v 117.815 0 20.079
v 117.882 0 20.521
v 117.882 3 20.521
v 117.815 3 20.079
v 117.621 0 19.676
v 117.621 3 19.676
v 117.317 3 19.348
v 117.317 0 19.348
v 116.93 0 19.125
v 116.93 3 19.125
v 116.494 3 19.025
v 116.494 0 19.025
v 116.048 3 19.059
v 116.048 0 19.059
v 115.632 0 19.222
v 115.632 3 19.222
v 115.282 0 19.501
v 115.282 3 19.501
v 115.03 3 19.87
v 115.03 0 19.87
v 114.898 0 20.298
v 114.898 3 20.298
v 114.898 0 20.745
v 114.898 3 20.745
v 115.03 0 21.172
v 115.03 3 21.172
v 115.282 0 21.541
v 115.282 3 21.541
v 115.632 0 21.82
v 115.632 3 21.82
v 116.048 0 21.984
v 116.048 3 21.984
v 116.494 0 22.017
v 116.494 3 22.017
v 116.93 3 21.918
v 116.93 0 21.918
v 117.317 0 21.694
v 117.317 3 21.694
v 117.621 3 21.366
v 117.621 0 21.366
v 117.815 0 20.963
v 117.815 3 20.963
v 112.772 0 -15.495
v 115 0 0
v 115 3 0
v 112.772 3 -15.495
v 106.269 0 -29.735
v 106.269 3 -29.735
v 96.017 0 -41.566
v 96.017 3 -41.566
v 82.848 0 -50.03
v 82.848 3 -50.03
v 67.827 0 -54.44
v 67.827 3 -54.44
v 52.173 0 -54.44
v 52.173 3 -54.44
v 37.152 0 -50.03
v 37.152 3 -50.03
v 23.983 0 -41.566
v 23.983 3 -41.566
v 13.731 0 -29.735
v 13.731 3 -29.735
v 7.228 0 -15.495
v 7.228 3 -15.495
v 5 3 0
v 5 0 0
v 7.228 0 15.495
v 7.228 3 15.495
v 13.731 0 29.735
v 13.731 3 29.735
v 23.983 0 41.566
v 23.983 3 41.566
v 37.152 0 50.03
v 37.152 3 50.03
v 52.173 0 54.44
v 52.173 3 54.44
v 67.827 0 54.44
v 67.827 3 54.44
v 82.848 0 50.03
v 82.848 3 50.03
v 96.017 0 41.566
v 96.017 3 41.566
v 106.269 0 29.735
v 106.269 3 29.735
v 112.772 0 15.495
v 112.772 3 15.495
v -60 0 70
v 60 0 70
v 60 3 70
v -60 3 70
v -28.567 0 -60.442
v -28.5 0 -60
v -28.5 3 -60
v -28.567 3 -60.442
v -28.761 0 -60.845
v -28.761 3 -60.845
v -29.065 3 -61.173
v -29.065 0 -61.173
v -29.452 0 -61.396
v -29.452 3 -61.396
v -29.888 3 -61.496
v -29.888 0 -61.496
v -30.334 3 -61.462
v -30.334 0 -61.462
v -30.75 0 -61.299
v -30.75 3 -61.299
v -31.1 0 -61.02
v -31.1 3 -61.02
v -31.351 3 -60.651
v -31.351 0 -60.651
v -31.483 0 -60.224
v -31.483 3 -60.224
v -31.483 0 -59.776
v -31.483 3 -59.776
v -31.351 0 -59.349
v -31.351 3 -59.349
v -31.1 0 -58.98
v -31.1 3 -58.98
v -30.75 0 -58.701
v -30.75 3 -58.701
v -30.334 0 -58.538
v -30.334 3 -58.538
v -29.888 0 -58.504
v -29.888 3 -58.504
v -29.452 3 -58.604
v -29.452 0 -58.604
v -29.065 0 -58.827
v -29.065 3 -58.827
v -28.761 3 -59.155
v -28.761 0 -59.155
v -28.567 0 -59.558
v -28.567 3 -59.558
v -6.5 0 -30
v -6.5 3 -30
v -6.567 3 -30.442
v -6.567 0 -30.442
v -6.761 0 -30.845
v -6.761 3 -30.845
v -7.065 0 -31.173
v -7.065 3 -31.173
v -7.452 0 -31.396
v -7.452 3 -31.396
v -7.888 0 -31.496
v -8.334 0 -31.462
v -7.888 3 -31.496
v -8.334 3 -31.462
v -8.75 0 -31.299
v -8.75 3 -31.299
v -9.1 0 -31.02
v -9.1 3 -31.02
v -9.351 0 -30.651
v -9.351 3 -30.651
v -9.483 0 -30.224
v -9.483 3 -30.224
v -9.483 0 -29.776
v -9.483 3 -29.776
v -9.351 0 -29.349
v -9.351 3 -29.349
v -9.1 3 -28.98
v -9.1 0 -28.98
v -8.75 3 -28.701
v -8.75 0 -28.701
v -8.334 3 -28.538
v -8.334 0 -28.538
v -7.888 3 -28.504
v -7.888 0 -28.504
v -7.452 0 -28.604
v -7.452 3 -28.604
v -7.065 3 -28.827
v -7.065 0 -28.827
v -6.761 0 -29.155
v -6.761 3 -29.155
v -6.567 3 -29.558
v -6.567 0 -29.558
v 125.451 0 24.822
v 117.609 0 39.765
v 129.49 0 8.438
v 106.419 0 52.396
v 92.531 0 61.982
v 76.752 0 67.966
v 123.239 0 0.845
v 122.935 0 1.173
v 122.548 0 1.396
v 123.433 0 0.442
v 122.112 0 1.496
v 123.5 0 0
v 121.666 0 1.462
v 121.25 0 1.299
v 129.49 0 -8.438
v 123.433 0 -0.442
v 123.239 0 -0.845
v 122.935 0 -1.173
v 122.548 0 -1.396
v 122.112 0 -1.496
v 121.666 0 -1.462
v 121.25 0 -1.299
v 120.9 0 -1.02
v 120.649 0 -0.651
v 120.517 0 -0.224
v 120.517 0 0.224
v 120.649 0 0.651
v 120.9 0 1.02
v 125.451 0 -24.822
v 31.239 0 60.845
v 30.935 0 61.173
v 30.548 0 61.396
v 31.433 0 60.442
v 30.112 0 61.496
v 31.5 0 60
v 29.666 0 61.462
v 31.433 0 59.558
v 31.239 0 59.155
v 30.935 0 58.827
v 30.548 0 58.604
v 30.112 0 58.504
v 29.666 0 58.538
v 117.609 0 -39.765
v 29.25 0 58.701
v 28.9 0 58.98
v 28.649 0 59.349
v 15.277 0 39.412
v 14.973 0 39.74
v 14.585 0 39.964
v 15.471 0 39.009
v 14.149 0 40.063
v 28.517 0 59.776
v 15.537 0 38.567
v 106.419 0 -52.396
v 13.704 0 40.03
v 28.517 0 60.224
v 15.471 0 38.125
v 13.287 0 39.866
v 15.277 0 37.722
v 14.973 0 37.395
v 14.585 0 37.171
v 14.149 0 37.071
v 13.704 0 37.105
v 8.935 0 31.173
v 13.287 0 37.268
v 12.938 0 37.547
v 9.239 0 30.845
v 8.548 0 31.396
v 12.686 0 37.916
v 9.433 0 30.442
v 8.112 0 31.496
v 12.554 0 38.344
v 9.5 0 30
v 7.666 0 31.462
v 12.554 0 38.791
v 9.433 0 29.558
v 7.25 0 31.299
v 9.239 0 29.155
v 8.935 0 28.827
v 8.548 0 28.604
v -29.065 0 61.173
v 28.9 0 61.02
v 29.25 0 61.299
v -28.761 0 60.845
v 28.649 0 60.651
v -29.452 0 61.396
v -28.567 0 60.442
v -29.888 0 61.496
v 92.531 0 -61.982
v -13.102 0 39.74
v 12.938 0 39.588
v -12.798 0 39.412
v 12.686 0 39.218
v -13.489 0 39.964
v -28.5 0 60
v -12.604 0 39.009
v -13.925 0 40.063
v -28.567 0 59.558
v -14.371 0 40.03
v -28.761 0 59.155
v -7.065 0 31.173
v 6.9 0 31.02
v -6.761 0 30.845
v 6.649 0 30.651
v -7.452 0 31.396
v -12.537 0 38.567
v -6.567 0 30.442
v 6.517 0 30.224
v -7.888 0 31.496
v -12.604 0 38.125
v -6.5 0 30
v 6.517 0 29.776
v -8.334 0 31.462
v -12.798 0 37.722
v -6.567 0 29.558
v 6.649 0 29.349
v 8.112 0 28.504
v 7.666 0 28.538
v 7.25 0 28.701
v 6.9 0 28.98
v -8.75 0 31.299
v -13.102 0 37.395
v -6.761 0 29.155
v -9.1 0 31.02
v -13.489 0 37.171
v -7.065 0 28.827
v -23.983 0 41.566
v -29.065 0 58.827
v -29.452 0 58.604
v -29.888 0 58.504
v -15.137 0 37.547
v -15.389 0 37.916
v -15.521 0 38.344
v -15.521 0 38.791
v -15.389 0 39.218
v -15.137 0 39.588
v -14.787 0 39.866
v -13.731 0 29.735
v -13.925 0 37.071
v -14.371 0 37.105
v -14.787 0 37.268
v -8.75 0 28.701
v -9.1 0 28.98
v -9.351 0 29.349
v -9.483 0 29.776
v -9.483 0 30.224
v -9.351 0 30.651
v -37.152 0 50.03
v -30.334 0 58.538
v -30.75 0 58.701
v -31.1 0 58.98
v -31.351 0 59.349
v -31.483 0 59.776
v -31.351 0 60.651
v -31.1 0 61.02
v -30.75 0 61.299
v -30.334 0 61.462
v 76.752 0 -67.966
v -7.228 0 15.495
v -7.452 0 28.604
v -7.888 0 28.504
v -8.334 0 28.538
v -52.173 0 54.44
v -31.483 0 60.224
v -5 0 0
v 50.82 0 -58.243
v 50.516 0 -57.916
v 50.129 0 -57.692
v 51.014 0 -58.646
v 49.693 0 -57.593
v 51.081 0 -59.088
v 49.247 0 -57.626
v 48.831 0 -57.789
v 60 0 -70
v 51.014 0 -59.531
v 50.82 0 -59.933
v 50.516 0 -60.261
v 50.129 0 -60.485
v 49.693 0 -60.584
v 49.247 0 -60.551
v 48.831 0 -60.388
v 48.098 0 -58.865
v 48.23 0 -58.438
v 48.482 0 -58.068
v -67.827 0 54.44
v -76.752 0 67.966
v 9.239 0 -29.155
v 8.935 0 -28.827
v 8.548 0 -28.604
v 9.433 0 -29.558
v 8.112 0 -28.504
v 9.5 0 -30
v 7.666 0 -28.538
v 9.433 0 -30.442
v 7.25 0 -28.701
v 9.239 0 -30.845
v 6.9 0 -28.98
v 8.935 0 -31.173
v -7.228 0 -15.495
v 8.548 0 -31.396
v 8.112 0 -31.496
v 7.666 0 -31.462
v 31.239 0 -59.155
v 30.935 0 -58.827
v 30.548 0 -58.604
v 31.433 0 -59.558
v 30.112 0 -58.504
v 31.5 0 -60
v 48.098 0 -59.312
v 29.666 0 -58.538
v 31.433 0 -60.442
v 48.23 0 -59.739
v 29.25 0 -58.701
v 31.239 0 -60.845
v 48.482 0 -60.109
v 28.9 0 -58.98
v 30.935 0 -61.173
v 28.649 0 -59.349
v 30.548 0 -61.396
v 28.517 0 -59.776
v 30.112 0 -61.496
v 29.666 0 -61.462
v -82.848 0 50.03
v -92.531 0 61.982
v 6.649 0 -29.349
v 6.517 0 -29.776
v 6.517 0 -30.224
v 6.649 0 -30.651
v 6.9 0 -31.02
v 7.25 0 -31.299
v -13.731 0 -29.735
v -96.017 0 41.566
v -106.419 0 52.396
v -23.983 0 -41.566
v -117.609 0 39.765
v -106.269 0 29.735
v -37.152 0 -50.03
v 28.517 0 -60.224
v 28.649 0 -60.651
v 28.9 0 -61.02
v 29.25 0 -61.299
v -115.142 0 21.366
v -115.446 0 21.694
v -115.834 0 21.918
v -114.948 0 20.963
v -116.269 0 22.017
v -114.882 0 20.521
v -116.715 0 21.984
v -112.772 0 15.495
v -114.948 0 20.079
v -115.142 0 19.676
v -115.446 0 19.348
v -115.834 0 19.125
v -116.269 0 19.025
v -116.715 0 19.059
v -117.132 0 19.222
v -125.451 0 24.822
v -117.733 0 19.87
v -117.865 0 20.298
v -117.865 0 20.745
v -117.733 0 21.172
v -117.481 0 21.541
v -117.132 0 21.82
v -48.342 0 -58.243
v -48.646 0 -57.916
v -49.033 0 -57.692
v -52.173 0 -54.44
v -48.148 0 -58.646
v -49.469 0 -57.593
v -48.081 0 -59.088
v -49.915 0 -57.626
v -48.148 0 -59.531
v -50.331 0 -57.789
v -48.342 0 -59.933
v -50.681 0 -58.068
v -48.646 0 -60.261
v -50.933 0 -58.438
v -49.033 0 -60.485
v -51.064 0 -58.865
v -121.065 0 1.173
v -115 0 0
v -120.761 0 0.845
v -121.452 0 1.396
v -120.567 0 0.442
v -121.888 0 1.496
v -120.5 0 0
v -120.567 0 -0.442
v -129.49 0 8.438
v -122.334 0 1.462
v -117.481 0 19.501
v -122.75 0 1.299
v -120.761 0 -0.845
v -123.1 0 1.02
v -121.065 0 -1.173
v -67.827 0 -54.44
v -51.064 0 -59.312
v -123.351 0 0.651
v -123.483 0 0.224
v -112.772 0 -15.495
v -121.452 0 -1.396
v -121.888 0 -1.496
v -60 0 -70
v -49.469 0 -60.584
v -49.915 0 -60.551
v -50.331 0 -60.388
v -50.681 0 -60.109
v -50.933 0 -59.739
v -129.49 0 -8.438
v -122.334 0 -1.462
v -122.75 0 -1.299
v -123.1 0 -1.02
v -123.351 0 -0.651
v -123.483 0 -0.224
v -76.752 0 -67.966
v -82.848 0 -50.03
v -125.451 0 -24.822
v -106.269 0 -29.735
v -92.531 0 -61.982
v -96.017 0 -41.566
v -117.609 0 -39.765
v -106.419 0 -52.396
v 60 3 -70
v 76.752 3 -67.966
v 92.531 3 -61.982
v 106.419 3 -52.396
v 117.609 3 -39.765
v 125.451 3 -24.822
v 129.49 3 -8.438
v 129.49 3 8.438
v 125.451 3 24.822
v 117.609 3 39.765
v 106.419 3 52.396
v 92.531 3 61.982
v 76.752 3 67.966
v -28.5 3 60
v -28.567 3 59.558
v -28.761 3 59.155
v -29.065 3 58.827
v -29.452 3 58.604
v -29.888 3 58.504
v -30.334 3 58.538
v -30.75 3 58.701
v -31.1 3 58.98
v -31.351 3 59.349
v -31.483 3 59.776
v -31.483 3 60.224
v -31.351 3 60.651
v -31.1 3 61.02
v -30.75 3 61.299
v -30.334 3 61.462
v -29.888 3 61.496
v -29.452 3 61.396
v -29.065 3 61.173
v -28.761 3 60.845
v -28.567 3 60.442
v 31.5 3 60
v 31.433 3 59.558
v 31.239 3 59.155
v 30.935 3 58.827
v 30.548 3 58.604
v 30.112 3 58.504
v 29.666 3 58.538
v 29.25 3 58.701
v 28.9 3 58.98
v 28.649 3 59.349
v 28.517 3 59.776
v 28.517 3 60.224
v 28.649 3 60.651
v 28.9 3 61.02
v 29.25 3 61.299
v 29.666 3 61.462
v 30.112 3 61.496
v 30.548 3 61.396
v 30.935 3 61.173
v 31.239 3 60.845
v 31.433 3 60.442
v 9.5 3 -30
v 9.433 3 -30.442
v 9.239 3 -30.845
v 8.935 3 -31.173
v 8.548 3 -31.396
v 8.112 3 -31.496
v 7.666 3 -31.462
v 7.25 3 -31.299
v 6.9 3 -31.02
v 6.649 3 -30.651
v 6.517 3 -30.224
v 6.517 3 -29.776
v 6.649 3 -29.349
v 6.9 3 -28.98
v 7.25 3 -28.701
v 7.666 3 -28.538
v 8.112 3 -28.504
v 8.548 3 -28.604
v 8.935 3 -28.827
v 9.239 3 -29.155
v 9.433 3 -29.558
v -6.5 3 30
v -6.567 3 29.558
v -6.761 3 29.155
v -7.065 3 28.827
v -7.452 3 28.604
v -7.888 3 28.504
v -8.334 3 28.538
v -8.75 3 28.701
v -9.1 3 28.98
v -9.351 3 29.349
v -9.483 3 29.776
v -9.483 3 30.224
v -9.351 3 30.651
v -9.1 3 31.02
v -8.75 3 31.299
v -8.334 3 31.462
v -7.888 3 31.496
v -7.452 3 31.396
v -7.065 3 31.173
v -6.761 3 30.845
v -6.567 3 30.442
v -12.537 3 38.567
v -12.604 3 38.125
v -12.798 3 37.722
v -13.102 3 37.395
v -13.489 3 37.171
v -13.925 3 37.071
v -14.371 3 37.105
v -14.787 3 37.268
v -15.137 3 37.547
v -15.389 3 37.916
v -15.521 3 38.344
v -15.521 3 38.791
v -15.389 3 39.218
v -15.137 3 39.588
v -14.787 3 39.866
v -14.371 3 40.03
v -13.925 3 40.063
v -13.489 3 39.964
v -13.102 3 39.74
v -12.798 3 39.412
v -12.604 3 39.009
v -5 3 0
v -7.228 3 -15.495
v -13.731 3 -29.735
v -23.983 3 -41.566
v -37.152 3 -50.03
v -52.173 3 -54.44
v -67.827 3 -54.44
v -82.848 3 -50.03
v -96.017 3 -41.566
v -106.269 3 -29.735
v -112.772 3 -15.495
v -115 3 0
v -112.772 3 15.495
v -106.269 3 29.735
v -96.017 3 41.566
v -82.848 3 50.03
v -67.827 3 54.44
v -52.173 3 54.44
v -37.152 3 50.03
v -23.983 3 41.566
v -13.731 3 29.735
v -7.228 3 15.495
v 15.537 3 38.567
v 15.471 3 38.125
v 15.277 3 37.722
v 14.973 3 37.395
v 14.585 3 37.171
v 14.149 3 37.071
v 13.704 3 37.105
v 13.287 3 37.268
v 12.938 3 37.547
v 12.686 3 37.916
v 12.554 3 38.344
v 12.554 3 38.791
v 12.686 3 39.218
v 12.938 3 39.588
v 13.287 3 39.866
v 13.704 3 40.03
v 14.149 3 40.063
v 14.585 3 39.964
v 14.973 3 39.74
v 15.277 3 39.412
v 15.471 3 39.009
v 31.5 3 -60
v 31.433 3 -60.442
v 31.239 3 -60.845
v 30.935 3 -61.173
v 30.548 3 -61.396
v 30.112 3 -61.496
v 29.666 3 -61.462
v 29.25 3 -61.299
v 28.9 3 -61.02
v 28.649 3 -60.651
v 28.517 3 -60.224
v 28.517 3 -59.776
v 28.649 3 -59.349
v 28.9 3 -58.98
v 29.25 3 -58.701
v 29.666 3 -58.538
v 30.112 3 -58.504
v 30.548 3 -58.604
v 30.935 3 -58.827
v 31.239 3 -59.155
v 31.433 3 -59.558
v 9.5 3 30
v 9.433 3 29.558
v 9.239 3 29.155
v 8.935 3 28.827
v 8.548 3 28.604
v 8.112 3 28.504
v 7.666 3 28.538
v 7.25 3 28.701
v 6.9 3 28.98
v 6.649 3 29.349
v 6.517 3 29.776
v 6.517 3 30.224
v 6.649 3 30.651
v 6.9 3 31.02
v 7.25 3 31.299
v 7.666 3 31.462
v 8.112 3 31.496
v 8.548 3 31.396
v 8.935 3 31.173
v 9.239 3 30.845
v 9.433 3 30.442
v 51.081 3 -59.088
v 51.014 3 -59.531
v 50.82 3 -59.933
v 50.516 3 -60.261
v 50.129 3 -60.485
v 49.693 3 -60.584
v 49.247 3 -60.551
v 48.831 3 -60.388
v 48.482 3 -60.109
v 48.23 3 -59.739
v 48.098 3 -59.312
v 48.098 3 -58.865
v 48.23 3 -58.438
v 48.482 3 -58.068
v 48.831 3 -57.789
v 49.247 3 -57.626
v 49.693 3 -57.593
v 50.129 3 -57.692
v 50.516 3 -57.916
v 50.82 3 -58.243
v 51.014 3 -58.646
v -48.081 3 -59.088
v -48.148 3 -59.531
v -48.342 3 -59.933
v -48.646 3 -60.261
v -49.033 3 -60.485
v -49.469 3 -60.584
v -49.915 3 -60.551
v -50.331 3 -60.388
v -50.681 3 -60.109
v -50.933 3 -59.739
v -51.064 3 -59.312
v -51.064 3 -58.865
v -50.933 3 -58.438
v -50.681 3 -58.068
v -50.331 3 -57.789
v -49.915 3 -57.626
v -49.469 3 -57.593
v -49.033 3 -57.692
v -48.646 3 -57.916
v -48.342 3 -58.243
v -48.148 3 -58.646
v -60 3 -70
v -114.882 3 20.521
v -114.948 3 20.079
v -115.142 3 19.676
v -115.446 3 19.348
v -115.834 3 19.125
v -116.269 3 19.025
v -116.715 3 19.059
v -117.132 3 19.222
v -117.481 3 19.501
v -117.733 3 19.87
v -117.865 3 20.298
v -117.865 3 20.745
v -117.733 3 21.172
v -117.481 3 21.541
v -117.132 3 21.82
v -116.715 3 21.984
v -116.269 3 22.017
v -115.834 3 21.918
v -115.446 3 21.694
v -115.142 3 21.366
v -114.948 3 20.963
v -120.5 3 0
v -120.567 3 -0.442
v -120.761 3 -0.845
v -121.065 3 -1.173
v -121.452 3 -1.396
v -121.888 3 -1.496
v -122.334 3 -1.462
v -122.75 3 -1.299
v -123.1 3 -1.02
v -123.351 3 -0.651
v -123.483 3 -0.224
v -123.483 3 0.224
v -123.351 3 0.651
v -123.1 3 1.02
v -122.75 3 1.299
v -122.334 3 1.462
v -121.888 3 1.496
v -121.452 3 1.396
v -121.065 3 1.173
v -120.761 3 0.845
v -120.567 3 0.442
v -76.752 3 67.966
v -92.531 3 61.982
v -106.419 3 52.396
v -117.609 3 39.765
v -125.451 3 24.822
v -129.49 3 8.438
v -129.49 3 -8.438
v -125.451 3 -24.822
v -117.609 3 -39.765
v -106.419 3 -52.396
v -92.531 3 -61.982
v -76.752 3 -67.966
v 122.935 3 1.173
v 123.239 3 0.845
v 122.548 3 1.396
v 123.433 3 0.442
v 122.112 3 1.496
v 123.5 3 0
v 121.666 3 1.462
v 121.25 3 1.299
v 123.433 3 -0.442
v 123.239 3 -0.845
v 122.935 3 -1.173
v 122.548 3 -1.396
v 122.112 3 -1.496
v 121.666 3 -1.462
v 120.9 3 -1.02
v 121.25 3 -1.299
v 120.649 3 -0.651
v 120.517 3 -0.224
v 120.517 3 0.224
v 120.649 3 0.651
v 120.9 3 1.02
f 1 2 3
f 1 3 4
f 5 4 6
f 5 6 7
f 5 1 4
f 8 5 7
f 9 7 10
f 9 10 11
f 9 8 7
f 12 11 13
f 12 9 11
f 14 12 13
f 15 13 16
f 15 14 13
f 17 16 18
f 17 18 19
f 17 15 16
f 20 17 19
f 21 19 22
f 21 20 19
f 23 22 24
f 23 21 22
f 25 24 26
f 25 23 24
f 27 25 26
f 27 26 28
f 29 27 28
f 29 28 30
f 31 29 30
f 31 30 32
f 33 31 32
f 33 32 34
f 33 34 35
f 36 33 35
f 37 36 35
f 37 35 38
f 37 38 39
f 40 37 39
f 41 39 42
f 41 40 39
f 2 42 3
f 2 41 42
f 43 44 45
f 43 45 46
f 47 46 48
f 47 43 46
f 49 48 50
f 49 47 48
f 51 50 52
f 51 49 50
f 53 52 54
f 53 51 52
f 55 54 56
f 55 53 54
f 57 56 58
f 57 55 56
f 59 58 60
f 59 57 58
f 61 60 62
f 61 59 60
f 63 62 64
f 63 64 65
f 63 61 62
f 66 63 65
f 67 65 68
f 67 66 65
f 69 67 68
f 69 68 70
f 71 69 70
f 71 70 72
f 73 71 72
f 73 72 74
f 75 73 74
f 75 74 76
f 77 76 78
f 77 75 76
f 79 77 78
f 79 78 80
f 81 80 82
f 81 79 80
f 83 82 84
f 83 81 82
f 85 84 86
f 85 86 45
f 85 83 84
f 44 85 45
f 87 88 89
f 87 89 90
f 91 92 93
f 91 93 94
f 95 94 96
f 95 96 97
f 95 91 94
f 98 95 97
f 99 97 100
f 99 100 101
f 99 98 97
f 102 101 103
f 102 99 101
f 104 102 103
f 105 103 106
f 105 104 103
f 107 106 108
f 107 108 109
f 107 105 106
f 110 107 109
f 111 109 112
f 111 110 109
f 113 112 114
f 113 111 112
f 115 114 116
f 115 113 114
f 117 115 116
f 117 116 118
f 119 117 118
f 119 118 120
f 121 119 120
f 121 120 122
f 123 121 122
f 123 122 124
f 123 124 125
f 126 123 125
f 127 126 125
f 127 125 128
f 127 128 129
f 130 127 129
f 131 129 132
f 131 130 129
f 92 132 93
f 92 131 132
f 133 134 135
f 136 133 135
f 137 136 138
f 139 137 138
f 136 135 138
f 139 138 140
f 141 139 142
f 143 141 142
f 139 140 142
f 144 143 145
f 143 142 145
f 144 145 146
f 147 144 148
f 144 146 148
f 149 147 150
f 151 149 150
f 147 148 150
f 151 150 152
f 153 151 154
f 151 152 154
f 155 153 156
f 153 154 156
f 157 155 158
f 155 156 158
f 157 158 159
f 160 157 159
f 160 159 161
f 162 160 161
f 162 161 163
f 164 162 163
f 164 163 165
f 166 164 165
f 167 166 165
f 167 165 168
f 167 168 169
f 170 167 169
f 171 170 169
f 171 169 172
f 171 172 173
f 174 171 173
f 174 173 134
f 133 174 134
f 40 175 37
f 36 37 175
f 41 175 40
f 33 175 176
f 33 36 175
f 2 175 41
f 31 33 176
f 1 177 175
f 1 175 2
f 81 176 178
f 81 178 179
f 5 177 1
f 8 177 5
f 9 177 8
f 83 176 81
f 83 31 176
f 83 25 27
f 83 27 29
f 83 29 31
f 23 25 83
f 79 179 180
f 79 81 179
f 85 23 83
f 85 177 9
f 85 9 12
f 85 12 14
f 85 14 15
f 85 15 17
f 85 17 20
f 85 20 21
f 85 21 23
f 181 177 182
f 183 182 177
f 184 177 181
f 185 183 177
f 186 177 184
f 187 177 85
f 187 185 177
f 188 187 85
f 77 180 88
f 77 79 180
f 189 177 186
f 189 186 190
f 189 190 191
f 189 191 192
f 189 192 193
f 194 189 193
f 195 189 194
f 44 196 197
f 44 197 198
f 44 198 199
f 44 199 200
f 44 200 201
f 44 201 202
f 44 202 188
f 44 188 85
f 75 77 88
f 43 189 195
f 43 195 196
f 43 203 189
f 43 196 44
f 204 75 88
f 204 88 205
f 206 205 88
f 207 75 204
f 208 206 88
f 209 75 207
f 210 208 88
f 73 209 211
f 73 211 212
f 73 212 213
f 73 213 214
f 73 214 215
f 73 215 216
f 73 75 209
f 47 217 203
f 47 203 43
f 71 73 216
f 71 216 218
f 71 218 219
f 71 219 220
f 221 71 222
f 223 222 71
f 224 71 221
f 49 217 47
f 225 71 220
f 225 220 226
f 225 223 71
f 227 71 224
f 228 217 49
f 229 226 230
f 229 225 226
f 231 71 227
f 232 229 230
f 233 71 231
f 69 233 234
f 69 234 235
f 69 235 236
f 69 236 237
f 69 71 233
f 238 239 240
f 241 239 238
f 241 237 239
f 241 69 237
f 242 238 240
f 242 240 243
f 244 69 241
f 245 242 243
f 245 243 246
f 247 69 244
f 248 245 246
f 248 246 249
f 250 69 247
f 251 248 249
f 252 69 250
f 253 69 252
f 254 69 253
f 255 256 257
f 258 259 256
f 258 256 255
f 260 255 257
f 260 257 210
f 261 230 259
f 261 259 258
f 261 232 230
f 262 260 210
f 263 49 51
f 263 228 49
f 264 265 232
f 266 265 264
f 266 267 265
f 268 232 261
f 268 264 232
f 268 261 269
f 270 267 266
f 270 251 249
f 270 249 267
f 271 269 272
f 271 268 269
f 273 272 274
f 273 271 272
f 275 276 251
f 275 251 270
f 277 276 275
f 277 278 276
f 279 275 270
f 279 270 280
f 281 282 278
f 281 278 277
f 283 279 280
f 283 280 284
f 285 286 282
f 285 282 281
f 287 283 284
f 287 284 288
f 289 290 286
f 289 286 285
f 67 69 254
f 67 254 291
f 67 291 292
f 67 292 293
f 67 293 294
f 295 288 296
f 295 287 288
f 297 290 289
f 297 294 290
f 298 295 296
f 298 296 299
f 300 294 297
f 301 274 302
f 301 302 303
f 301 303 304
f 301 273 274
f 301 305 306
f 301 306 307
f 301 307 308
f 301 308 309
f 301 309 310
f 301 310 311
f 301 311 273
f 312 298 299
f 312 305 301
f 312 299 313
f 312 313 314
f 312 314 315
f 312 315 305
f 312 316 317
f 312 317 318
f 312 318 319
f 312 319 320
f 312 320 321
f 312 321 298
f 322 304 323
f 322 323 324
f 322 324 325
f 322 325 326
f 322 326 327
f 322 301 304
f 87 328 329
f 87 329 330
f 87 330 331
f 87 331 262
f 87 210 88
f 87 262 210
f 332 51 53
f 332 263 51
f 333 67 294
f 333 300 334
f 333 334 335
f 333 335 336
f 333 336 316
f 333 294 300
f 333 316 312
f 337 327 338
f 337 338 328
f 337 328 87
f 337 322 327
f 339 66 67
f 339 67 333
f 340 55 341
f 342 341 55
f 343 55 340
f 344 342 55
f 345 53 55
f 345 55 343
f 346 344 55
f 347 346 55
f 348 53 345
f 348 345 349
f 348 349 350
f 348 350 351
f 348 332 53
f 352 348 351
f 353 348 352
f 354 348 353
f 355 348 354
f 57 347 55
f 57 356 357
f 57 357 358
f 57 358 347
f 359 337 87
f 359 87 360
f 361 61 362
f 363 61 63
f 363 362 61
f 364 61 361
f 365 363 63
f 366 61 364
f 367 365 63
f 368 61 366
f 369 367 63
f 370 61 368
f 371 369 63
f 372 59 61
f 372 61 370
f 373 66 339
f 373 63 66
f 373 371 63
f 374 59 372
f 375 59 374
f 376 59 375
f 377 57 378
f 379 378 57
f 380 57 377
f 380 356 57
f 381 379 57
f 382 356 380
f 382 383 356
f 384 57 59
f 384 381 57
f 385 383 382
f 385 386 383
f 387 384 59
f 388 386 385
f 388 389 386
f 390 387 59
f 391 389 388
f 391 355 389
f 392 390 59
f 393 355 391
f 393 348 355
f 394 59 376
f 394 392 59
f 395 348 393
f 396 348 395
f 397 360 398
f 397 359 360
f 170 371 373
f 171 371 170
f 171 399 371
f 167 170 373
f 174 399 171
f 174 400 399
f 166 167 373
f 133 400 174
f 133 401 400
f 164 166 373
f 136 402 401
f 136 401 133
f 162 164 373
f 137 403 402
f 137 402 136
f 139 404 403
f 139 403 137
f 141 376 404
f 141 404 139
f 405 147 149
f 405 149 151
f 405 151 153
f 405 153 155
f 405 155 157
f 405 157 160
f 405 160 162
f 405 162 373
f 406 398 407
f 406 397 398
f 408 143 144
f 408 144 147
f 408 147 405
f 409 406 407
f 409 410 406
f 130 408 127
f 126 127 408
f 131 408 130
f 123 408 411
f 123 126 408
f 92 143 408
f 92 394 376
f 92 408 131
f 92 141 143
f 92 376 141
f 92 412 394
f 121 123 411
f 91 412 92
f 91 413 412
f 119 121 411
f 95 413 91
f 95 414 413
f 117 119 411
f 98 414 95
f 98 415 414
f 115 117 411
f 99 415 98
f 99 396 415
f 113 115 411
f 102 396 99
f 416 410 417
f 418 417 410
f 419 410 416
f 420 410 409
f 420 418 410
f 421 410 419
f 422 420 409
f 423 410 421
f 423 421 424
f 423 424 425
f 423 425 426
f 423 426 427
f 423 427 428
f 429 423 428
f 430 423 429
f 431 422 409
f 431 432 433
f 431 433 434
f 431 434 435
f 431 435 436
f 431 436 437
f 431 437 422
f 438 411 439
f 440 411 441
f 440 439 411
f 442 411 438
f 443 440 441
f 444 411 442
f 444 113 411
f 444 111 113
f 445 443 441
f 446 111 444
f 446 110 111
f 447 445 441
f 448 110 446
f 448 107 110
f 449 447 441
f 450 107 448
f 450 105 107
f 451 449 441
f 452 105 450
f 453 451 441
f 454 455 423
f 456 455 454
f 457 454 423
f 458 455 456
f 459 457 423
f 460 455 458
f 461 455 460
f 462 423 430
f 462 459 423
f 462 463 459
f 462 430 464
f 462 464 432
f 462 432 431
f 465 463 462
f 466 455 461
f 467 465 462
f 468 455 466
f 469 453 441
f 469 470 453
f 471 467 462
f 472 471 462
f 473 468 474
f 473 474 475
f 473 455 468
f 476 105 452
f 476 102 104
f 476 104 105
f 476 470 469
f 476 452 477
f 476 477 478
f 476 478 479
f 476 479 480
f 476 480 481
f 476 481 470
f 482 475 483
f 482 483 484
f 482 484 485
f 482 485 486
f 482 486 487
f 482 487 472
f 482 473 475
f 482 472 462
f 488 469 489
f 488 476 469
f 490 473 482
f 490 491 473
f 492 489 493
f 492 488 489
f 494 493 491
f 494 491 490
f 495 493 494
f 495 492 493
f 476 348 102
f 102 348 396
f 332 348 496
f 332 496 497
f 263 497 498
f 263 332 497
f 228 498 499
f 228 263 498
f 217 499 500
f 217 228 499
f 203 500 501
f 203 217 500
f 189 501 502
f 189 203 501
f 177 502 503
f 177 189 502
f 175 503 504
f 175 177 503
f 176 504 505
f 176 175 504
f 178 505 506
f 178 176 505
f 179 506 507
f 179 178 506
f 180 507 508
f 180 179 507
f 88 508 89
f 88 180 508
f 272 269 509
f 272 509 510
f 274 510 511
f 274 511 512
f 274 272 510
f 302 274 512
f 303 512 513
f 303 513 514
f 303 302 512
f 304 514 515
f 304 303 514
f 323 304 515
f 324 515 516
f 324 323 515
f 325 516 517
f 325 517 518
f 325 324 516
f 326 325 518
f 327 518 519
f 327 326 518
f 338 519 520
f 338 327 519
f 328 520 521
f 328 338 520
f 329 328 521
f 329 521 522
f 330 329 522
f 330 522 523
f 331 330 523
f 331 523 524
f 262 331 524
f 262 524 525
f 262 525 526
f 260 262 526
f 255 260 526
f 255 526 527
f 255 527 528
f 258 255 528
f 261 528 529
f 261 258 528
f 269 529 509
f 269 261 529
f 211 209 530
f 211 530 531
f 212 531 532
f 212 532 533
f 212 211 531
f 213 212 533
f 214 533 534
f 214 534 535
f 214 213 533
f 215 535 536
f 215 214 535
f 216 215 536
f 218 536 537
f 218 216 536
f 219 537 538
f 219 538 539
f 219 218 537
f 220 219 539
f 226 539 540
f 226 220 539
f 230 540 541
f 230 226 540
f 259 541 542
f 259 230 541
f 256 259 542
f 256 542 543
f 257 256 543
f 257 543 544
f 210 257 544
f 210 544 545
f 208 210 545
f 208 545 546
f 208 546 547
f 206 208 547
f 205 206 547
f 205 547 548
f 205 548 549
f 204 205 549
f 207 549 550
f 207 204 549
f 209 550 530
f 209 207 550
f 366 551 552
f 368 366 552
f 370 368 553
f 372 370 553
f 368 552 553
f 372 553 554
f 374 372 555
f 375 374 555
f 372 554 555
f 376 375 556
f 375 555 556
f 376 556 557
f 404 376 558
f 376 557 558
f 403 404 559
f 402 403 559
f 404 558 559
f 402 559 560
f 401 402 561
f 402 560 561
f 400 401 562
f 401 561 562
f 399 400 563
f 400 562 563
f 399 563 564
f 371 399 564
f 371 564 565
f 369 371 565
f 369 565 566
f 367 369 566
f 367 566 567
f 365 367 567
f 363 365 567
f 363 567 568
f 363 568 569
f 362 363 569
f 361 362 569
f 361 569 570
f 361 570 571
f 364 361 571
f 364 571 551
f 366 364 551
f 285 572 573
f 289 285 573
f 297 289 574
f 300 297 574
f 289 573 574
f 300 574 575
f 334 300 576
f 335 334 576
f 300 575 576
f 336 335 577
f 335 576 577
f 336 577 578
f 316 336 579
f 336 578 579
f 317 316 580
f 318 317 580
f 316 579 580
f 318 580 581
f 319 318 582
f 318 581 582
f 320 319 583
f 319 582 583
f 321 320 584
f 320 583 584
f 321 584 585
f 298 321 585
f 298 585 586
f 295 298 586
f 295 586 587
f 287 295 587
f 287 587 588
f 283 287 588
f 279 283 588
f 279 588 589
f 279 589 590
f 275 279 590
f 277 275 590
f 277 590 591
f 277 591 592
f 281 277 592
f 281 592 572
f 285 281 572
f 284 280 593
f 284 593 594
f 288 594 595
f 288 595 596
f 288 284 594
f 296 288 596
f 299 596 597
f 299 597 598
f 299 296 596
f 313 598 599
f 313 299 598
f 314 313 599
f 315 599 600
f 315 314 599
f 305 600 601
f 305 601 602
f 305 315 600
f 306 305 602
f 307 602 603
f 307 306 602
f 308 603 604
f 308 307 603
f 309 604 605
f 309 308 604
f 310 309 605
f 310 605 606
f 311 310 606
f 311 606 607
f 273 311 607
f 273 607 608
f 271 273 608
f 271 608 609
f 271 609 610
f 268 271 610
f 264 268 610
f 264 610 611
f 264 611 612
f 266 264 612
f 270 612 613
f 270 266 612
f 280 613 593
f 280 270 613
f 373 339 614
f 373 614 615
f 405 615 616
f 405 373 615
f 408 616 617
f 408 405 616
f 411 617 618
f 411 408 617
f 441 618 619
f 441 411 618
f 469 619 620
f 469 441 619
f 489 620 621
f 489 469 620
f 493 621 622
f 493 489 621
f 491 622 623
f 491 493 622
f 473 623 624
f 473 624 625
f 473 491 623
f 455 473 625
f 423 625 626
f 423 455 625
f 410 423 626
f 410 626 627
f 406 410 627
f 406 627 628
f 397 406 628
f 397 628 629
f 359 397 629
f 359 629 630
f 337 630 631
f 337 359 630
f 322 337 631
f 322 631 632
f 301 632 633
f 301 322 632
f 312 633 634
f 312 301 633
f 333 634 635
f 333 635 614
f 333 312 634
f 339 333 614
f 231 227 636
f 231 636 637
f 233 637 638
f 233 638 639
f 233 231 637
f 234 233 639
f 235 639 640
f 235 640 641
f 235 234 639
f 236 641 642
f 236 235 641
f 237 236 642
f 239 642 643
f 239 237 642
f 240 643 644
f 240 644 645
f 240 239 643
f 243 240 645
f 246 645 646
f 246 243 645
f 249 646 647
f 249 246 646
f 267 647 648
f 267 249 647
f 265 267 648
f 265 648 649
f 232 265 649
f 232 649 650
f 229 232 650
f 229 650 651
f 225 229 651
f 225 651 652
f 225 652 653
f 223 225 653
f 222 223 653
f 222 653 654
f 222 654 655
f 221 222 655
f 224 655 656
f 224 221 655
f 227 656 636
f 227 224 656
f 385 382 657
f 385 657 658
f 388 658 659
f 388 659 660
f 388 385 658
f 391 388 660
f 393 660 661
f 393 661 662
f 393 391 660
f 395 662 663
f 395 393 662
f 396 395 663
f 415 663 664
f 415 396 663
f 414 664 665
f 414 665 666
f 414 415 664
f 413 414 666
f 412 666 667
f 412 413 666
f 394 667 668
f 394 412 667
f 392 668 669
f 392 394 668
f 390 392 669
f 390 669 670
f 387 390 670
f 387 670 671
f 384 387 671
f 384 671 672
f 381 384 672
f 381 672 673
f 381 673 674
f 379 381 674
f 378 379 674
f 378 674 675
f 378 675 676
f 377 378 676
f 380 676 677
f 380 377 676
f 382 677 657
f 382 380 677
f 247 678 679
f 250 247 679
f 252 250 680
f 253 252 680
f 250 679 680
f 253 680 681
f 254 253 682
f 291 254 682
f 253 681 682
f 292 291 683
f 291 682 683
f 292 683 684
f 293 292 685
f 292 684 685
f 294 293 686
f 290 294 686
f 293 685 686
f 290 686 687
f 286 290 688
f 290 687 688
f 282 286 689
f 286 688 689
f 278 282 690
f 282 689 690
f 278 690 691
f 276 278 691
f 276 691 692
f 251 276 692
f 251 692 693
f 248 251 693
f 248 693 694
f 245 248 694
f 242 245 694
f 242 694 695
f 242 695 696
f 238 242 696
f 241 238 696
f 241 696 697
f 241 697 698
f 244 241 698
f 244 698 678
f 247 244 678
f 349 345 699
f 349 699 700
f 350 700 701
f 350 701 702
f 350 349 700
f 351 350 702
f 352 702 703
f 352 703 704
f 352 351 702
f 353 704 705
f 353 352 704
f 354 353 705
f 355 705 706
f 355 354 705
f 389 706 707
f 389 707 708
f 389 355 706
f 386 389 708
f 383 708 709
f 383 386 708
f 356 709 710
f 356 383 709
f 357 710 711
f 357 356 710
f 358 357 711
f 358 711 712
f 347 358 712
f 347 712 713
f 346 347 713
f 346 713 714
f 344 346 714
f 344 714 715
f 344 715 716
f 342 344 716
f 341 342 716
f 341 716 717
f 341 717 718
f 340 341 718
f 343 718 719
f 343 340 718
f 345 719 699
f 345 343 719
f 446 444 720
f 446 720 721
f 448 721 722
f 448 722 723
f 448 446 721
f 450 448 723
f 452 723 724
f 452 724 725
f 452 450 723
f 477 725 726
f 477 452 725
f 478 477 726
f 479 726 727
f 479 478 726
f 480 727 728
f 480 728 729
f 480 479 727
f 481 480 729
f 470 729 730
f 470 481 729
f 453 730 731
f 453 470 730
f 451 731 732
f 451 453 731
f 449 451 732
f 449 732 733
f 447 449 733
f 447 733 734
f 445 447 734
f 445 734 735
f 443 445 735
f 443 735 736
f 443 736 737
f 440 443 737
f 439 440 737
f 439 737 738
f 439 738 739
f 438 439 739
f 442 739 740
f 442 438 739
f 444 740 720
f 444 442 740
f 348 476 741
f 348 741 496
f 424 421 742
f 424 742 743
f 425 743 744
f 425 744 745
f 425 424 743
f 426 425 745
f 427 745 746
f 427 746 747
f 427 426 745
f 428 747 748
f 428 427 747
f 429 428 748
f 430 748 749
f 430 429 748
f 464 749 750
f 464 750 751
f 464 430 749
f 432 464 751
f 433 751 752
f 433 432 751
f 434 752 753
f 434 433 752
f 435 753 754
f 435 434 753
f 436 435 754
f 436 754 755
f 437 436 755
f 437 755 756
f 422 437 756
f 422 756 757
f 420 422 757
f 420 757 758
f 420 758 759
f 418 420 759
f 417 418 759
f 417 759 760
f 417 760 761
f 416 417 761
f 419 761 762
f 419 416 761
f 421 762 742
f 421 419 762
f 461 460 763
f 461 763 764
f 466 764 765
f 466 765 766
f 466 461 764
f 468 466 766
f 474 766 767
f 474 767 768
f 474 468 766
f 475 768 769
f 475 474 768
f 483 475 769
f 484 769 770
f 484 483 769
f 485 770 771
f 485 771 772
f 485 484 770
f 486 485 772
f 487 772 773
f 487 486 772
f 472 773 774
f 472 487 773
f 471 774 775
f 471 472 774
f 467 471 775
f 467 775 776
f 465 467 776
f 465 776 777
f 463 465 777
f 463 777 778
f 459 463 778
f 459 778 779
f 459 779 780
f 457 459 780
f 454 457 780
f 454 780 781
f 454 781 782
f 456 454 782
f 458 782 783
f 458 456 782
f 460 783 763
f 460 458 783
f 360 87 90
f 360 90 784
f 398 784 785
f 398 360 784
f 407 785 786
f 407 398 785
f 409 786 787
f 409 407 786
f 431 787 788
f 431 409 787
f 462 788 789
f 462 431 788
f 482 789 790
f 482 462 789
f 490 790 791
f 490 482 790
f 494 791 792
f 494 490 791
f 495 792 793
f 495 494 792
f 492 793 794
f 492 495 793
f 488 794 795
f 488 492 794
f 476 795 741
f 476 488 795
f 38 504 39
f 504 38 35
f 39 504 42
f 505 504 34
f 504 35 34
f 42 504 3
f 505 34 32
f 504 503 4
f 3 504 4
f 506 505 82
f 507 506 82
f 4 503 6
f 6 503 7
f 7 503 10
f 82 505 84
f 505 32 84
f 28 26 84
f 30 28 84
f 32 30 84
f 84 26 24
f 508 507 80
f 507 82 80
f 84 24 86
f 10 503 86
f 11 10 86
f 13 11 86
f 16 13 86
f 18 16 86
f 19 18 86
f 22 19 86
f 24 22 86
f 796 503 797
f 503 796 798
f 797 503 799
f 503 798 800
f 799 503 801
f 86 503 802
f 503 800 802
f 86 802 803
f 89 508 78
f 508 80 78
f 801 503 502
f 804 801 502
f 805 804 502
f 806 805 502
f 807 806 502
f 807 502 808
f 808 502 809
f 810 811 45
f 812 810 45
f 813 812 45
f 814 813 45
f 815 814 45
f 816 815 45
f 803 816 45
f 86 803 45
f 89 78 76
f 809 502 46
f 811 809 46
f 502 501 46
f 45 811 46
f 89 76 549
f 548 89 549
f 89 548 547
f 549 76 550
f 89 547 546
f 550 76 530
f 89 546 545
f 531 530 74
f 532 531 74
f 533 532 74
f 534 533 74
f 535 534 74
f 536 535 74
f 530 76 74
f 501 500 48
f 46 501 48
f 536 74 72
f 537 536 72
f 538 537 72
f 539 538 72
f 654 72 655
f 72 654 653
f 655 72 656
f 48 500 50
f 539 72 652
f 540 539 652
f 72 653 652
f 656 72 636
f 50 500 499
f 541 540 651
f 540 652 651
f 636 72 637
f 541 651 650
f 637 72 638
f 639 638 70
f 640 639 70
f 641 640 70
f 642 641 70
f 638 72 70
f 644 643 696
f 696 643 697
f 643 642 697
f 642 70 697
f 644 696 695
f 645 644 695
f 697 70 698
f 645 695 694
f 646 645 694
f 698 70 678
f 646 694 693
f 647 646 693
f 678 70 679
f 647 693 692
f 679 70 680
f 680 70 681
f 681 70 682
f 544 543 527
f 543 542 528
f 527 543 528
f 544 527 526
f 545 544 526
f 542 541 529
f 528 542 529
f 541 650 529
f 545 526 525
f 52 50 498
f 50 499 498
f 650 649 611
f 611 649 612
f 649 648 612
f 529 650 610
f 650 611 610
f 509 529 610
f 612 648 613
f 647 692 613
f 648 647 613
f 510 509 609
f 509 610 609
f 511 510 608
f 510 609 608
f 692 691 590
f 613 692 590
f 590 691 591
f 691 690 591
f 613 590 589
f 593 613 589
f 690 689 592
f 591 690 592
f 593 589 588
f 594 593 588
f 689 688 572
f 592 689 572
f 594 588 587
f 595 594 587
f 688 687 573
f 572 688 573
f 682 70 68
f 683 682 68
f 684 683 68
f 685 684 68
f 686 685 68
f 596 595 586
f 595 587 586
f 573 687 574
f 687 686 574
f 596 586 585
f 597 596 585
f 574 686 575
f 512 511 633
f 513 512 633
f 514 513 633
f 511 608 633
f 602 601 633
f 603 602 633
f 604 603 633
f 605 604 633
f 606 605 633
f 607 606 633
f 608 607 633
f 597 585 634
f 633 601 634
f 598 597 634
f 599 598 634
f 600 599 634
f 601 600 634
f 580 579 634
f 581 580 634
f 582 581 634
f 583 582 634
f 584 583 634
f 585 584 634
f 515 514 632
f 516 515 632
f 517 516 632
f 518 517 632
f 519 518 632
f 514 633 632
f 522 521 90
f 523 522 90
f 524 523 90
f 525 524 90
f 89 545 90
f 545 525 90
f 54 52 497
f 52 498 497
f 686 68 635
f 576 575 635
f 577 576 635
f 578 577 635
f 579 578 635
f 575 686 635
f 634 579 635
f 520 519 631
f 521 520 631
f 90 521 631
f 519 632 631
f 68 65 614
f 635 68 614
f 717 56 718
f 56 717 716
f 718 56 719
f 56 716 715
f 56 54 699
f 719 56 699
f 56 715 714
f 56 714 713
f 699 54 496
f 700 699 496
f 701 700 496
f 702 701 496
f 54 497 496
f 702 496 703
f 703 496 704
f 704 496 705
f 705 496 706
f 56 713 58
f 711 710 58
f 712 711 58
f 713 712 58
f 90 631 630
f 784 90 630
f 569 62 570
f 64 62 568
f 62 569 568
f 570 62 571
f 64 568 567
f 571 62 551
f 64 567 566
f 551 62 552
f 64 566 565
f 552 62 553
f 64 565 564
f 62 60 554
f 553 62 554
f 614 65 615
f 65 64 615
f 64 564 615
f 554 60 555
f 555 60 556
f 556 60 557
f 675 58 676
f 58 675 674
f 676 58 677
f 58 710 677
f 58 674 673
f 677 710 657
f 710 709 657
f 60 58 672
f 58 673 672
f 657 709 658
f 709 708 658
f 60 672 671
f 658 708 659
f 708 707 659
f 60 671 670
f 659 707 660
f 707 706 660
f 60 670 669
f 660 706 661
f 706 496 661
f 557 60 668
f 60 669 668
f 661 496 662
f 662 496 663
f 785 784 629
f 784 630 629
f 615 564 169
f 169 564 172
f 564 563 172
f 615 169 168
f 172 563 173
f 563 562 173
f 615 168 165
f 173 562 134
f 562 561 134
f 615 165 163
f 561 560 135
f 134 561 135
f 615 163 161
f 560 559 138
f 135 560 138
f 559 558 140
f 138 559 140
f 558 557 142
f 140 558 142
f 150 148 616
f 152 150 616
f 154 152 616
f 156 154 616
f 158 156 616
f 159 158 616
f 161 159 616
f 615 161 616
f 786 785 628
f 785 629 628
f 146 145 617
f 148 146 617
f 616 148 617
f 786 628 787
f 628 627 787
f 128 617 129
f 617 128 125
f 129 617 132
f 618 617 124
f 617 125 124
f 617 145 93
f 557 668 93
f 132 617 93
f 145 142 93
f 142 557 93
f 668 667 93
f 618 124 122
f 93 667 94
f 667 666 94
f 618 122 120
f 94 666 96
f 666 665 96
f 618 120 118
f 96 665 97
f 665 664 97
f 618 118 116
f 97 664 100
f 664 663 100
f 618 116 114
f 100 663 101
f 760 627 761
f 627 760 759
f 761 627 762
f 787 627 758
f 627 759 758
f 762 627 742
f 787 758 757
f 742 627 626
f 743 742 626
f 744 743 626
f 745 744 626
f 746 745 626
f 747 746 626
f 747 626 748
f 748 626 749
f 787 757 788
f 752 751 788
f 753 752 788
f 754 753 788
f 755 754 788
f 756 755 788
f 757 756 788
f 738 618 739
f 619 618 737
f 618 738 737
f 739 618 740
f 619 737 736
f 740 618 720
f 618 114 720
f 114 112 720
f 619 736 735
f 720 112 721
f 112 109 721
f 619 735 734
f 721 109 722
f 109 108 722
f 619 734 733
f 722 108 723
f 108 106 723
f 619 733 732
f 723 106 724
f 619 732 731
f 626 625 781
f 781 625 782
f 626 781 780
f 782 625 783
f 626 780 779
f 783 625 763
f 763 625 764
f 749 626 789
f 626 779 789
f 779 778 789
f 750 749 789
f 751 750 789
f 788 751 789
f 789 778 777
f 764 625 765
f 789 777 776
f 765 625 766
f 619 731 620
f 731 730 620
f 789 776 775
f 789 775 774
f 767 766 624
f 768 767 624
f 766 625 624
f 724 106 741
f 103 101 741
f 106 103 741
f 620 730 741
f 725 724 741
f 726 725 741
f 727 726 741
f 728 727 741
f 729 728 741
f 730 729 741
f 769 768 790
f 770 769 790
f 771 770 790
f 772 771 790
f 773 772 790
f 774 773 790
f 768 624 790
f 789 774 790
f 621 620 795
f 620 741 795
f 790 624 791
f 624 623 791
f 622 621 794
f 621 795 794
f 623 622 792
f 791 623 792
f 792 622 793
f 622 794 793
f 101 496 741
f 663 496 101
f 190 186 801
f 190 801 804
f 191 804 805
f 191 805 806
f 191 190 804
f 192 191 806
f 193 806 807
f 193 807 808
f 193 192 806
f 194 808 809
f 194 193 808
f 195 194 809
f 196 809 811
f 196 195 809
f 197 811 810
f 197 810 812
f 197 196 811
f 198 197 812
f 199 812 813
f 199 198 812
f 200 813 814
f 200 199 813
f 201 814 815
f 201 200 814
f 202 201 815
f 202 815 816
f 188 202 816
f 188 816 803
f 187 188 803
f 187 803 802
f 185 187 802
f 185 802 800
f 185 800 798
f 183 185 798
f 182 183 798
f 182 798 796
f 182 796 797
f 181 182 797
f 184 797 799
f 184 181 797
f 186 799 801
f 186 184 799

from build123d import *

# Parameters (mm, degrees)
SKETCH_1_R          = 55
SKETCH_1_R_2        = 1.5
EXTRUDE_2_DEPTH     = 3
SKETCH_2_R          = 1.5
CUT_EXTRUDE_1_DEPTH = 10


with BuildPart() as part:
    # 草图1 → 凸台-拉伸2 (new body)
    with BuildSketch(Plane(origin=(0, 0, 0), x_dir=(1, 0, 0), z_dir=(0, 1, 0))):
        with BuildLine():
            Line((-60, 70), (60, 70))
            ThreePointArc((60, 70), (130, 0), (60, -70))
            Line((60, -70), (-60, -70))
            ThreePointArc((-60, -70), (-130, 0), (-60, 70))
        make_face()
        with Locations((-60, 0)):
            Circle(SKETCH_1_R, mode=Mode.SUBTRACT)
        with Locations((60, 0)):
            Circle(SKETCH_1_R, mode=Mode.SUBTRACT)
        with Locations((-122, 0)):
            Circle(SKETCH_1_R_2, mode=Mode.SUBTRACT)
        with Locations((122, 0)):
            Circle(SKETCH_1_R_2, mode=Mode.SUBTRACT)
        with Locations((-30, 60)):
            Circle(SKETCH_1_R_2, mode=Mode.SUBTRACT)
        with Locations((30, 60)):
            Circle(SKETCH_1_R_2, mode=Mode.SUBTRACT)
        with Locations((30, -60)):
            Circle(SKETCH_1_R_2, mode=Mode.SUBTRACT)
        with Locations((-30, -60)):
            Circle(SKETCH_1_R_2, mode=Mode.SUBTRACT)
        with Locations((-49.58110934, 59.088465181)):
            Circle(SKETCH_1_R_2, mode=Mode.SUBTRACT)
        with Locations((-116.381557247, -20.5212086)):
            Circle(SKETCH_1_R_2, mode=Mode.SUBTRACT)
        with Locations((-14.037333413, -38.567256581)):
            Circle(SKETCH_1_R_2, mode=Mode.SUBTRACT)
        with Locations((14.037333413, -38.567256581)):
            Circle(SKETCH_1_R_2, mode=Mode.SUBTRACT)
        with Locations((116.381557247, -20.5212086)):
            Circle(SKETCH_1_R_2, mode=Mode.SUBTRACT)
        with Locations((49.58110934, 59.088465181)):
            Circle(SKETCH_1_R_2, mode=Mode.SUBTRACT)
    extrude(amount=EXTRUDE_2_DEPTH)

    # 草图2 → 切除-拉伸1 (cut)
    with BuildSketch(Plane(origin=(0, 3, 0), x_dir=(1, 0, 0), z_dir=(0, 1, 0))):
        with Locations((-8, -30)):
            Circle(SKETCH_2_R)
        with Locations((8, -30)):
            Circle(SKETCH_2_R)
        with Locations((8, 30)):
            Circle(SKETCH_2_R)
        with Locations((-8, 30)):
            Circle(SKETCH_2_R)
    extrude(amount=-CUT_EXTRUDE_1_DEPTH, mode=Mode.SUBTRACT)


solid = part.part
